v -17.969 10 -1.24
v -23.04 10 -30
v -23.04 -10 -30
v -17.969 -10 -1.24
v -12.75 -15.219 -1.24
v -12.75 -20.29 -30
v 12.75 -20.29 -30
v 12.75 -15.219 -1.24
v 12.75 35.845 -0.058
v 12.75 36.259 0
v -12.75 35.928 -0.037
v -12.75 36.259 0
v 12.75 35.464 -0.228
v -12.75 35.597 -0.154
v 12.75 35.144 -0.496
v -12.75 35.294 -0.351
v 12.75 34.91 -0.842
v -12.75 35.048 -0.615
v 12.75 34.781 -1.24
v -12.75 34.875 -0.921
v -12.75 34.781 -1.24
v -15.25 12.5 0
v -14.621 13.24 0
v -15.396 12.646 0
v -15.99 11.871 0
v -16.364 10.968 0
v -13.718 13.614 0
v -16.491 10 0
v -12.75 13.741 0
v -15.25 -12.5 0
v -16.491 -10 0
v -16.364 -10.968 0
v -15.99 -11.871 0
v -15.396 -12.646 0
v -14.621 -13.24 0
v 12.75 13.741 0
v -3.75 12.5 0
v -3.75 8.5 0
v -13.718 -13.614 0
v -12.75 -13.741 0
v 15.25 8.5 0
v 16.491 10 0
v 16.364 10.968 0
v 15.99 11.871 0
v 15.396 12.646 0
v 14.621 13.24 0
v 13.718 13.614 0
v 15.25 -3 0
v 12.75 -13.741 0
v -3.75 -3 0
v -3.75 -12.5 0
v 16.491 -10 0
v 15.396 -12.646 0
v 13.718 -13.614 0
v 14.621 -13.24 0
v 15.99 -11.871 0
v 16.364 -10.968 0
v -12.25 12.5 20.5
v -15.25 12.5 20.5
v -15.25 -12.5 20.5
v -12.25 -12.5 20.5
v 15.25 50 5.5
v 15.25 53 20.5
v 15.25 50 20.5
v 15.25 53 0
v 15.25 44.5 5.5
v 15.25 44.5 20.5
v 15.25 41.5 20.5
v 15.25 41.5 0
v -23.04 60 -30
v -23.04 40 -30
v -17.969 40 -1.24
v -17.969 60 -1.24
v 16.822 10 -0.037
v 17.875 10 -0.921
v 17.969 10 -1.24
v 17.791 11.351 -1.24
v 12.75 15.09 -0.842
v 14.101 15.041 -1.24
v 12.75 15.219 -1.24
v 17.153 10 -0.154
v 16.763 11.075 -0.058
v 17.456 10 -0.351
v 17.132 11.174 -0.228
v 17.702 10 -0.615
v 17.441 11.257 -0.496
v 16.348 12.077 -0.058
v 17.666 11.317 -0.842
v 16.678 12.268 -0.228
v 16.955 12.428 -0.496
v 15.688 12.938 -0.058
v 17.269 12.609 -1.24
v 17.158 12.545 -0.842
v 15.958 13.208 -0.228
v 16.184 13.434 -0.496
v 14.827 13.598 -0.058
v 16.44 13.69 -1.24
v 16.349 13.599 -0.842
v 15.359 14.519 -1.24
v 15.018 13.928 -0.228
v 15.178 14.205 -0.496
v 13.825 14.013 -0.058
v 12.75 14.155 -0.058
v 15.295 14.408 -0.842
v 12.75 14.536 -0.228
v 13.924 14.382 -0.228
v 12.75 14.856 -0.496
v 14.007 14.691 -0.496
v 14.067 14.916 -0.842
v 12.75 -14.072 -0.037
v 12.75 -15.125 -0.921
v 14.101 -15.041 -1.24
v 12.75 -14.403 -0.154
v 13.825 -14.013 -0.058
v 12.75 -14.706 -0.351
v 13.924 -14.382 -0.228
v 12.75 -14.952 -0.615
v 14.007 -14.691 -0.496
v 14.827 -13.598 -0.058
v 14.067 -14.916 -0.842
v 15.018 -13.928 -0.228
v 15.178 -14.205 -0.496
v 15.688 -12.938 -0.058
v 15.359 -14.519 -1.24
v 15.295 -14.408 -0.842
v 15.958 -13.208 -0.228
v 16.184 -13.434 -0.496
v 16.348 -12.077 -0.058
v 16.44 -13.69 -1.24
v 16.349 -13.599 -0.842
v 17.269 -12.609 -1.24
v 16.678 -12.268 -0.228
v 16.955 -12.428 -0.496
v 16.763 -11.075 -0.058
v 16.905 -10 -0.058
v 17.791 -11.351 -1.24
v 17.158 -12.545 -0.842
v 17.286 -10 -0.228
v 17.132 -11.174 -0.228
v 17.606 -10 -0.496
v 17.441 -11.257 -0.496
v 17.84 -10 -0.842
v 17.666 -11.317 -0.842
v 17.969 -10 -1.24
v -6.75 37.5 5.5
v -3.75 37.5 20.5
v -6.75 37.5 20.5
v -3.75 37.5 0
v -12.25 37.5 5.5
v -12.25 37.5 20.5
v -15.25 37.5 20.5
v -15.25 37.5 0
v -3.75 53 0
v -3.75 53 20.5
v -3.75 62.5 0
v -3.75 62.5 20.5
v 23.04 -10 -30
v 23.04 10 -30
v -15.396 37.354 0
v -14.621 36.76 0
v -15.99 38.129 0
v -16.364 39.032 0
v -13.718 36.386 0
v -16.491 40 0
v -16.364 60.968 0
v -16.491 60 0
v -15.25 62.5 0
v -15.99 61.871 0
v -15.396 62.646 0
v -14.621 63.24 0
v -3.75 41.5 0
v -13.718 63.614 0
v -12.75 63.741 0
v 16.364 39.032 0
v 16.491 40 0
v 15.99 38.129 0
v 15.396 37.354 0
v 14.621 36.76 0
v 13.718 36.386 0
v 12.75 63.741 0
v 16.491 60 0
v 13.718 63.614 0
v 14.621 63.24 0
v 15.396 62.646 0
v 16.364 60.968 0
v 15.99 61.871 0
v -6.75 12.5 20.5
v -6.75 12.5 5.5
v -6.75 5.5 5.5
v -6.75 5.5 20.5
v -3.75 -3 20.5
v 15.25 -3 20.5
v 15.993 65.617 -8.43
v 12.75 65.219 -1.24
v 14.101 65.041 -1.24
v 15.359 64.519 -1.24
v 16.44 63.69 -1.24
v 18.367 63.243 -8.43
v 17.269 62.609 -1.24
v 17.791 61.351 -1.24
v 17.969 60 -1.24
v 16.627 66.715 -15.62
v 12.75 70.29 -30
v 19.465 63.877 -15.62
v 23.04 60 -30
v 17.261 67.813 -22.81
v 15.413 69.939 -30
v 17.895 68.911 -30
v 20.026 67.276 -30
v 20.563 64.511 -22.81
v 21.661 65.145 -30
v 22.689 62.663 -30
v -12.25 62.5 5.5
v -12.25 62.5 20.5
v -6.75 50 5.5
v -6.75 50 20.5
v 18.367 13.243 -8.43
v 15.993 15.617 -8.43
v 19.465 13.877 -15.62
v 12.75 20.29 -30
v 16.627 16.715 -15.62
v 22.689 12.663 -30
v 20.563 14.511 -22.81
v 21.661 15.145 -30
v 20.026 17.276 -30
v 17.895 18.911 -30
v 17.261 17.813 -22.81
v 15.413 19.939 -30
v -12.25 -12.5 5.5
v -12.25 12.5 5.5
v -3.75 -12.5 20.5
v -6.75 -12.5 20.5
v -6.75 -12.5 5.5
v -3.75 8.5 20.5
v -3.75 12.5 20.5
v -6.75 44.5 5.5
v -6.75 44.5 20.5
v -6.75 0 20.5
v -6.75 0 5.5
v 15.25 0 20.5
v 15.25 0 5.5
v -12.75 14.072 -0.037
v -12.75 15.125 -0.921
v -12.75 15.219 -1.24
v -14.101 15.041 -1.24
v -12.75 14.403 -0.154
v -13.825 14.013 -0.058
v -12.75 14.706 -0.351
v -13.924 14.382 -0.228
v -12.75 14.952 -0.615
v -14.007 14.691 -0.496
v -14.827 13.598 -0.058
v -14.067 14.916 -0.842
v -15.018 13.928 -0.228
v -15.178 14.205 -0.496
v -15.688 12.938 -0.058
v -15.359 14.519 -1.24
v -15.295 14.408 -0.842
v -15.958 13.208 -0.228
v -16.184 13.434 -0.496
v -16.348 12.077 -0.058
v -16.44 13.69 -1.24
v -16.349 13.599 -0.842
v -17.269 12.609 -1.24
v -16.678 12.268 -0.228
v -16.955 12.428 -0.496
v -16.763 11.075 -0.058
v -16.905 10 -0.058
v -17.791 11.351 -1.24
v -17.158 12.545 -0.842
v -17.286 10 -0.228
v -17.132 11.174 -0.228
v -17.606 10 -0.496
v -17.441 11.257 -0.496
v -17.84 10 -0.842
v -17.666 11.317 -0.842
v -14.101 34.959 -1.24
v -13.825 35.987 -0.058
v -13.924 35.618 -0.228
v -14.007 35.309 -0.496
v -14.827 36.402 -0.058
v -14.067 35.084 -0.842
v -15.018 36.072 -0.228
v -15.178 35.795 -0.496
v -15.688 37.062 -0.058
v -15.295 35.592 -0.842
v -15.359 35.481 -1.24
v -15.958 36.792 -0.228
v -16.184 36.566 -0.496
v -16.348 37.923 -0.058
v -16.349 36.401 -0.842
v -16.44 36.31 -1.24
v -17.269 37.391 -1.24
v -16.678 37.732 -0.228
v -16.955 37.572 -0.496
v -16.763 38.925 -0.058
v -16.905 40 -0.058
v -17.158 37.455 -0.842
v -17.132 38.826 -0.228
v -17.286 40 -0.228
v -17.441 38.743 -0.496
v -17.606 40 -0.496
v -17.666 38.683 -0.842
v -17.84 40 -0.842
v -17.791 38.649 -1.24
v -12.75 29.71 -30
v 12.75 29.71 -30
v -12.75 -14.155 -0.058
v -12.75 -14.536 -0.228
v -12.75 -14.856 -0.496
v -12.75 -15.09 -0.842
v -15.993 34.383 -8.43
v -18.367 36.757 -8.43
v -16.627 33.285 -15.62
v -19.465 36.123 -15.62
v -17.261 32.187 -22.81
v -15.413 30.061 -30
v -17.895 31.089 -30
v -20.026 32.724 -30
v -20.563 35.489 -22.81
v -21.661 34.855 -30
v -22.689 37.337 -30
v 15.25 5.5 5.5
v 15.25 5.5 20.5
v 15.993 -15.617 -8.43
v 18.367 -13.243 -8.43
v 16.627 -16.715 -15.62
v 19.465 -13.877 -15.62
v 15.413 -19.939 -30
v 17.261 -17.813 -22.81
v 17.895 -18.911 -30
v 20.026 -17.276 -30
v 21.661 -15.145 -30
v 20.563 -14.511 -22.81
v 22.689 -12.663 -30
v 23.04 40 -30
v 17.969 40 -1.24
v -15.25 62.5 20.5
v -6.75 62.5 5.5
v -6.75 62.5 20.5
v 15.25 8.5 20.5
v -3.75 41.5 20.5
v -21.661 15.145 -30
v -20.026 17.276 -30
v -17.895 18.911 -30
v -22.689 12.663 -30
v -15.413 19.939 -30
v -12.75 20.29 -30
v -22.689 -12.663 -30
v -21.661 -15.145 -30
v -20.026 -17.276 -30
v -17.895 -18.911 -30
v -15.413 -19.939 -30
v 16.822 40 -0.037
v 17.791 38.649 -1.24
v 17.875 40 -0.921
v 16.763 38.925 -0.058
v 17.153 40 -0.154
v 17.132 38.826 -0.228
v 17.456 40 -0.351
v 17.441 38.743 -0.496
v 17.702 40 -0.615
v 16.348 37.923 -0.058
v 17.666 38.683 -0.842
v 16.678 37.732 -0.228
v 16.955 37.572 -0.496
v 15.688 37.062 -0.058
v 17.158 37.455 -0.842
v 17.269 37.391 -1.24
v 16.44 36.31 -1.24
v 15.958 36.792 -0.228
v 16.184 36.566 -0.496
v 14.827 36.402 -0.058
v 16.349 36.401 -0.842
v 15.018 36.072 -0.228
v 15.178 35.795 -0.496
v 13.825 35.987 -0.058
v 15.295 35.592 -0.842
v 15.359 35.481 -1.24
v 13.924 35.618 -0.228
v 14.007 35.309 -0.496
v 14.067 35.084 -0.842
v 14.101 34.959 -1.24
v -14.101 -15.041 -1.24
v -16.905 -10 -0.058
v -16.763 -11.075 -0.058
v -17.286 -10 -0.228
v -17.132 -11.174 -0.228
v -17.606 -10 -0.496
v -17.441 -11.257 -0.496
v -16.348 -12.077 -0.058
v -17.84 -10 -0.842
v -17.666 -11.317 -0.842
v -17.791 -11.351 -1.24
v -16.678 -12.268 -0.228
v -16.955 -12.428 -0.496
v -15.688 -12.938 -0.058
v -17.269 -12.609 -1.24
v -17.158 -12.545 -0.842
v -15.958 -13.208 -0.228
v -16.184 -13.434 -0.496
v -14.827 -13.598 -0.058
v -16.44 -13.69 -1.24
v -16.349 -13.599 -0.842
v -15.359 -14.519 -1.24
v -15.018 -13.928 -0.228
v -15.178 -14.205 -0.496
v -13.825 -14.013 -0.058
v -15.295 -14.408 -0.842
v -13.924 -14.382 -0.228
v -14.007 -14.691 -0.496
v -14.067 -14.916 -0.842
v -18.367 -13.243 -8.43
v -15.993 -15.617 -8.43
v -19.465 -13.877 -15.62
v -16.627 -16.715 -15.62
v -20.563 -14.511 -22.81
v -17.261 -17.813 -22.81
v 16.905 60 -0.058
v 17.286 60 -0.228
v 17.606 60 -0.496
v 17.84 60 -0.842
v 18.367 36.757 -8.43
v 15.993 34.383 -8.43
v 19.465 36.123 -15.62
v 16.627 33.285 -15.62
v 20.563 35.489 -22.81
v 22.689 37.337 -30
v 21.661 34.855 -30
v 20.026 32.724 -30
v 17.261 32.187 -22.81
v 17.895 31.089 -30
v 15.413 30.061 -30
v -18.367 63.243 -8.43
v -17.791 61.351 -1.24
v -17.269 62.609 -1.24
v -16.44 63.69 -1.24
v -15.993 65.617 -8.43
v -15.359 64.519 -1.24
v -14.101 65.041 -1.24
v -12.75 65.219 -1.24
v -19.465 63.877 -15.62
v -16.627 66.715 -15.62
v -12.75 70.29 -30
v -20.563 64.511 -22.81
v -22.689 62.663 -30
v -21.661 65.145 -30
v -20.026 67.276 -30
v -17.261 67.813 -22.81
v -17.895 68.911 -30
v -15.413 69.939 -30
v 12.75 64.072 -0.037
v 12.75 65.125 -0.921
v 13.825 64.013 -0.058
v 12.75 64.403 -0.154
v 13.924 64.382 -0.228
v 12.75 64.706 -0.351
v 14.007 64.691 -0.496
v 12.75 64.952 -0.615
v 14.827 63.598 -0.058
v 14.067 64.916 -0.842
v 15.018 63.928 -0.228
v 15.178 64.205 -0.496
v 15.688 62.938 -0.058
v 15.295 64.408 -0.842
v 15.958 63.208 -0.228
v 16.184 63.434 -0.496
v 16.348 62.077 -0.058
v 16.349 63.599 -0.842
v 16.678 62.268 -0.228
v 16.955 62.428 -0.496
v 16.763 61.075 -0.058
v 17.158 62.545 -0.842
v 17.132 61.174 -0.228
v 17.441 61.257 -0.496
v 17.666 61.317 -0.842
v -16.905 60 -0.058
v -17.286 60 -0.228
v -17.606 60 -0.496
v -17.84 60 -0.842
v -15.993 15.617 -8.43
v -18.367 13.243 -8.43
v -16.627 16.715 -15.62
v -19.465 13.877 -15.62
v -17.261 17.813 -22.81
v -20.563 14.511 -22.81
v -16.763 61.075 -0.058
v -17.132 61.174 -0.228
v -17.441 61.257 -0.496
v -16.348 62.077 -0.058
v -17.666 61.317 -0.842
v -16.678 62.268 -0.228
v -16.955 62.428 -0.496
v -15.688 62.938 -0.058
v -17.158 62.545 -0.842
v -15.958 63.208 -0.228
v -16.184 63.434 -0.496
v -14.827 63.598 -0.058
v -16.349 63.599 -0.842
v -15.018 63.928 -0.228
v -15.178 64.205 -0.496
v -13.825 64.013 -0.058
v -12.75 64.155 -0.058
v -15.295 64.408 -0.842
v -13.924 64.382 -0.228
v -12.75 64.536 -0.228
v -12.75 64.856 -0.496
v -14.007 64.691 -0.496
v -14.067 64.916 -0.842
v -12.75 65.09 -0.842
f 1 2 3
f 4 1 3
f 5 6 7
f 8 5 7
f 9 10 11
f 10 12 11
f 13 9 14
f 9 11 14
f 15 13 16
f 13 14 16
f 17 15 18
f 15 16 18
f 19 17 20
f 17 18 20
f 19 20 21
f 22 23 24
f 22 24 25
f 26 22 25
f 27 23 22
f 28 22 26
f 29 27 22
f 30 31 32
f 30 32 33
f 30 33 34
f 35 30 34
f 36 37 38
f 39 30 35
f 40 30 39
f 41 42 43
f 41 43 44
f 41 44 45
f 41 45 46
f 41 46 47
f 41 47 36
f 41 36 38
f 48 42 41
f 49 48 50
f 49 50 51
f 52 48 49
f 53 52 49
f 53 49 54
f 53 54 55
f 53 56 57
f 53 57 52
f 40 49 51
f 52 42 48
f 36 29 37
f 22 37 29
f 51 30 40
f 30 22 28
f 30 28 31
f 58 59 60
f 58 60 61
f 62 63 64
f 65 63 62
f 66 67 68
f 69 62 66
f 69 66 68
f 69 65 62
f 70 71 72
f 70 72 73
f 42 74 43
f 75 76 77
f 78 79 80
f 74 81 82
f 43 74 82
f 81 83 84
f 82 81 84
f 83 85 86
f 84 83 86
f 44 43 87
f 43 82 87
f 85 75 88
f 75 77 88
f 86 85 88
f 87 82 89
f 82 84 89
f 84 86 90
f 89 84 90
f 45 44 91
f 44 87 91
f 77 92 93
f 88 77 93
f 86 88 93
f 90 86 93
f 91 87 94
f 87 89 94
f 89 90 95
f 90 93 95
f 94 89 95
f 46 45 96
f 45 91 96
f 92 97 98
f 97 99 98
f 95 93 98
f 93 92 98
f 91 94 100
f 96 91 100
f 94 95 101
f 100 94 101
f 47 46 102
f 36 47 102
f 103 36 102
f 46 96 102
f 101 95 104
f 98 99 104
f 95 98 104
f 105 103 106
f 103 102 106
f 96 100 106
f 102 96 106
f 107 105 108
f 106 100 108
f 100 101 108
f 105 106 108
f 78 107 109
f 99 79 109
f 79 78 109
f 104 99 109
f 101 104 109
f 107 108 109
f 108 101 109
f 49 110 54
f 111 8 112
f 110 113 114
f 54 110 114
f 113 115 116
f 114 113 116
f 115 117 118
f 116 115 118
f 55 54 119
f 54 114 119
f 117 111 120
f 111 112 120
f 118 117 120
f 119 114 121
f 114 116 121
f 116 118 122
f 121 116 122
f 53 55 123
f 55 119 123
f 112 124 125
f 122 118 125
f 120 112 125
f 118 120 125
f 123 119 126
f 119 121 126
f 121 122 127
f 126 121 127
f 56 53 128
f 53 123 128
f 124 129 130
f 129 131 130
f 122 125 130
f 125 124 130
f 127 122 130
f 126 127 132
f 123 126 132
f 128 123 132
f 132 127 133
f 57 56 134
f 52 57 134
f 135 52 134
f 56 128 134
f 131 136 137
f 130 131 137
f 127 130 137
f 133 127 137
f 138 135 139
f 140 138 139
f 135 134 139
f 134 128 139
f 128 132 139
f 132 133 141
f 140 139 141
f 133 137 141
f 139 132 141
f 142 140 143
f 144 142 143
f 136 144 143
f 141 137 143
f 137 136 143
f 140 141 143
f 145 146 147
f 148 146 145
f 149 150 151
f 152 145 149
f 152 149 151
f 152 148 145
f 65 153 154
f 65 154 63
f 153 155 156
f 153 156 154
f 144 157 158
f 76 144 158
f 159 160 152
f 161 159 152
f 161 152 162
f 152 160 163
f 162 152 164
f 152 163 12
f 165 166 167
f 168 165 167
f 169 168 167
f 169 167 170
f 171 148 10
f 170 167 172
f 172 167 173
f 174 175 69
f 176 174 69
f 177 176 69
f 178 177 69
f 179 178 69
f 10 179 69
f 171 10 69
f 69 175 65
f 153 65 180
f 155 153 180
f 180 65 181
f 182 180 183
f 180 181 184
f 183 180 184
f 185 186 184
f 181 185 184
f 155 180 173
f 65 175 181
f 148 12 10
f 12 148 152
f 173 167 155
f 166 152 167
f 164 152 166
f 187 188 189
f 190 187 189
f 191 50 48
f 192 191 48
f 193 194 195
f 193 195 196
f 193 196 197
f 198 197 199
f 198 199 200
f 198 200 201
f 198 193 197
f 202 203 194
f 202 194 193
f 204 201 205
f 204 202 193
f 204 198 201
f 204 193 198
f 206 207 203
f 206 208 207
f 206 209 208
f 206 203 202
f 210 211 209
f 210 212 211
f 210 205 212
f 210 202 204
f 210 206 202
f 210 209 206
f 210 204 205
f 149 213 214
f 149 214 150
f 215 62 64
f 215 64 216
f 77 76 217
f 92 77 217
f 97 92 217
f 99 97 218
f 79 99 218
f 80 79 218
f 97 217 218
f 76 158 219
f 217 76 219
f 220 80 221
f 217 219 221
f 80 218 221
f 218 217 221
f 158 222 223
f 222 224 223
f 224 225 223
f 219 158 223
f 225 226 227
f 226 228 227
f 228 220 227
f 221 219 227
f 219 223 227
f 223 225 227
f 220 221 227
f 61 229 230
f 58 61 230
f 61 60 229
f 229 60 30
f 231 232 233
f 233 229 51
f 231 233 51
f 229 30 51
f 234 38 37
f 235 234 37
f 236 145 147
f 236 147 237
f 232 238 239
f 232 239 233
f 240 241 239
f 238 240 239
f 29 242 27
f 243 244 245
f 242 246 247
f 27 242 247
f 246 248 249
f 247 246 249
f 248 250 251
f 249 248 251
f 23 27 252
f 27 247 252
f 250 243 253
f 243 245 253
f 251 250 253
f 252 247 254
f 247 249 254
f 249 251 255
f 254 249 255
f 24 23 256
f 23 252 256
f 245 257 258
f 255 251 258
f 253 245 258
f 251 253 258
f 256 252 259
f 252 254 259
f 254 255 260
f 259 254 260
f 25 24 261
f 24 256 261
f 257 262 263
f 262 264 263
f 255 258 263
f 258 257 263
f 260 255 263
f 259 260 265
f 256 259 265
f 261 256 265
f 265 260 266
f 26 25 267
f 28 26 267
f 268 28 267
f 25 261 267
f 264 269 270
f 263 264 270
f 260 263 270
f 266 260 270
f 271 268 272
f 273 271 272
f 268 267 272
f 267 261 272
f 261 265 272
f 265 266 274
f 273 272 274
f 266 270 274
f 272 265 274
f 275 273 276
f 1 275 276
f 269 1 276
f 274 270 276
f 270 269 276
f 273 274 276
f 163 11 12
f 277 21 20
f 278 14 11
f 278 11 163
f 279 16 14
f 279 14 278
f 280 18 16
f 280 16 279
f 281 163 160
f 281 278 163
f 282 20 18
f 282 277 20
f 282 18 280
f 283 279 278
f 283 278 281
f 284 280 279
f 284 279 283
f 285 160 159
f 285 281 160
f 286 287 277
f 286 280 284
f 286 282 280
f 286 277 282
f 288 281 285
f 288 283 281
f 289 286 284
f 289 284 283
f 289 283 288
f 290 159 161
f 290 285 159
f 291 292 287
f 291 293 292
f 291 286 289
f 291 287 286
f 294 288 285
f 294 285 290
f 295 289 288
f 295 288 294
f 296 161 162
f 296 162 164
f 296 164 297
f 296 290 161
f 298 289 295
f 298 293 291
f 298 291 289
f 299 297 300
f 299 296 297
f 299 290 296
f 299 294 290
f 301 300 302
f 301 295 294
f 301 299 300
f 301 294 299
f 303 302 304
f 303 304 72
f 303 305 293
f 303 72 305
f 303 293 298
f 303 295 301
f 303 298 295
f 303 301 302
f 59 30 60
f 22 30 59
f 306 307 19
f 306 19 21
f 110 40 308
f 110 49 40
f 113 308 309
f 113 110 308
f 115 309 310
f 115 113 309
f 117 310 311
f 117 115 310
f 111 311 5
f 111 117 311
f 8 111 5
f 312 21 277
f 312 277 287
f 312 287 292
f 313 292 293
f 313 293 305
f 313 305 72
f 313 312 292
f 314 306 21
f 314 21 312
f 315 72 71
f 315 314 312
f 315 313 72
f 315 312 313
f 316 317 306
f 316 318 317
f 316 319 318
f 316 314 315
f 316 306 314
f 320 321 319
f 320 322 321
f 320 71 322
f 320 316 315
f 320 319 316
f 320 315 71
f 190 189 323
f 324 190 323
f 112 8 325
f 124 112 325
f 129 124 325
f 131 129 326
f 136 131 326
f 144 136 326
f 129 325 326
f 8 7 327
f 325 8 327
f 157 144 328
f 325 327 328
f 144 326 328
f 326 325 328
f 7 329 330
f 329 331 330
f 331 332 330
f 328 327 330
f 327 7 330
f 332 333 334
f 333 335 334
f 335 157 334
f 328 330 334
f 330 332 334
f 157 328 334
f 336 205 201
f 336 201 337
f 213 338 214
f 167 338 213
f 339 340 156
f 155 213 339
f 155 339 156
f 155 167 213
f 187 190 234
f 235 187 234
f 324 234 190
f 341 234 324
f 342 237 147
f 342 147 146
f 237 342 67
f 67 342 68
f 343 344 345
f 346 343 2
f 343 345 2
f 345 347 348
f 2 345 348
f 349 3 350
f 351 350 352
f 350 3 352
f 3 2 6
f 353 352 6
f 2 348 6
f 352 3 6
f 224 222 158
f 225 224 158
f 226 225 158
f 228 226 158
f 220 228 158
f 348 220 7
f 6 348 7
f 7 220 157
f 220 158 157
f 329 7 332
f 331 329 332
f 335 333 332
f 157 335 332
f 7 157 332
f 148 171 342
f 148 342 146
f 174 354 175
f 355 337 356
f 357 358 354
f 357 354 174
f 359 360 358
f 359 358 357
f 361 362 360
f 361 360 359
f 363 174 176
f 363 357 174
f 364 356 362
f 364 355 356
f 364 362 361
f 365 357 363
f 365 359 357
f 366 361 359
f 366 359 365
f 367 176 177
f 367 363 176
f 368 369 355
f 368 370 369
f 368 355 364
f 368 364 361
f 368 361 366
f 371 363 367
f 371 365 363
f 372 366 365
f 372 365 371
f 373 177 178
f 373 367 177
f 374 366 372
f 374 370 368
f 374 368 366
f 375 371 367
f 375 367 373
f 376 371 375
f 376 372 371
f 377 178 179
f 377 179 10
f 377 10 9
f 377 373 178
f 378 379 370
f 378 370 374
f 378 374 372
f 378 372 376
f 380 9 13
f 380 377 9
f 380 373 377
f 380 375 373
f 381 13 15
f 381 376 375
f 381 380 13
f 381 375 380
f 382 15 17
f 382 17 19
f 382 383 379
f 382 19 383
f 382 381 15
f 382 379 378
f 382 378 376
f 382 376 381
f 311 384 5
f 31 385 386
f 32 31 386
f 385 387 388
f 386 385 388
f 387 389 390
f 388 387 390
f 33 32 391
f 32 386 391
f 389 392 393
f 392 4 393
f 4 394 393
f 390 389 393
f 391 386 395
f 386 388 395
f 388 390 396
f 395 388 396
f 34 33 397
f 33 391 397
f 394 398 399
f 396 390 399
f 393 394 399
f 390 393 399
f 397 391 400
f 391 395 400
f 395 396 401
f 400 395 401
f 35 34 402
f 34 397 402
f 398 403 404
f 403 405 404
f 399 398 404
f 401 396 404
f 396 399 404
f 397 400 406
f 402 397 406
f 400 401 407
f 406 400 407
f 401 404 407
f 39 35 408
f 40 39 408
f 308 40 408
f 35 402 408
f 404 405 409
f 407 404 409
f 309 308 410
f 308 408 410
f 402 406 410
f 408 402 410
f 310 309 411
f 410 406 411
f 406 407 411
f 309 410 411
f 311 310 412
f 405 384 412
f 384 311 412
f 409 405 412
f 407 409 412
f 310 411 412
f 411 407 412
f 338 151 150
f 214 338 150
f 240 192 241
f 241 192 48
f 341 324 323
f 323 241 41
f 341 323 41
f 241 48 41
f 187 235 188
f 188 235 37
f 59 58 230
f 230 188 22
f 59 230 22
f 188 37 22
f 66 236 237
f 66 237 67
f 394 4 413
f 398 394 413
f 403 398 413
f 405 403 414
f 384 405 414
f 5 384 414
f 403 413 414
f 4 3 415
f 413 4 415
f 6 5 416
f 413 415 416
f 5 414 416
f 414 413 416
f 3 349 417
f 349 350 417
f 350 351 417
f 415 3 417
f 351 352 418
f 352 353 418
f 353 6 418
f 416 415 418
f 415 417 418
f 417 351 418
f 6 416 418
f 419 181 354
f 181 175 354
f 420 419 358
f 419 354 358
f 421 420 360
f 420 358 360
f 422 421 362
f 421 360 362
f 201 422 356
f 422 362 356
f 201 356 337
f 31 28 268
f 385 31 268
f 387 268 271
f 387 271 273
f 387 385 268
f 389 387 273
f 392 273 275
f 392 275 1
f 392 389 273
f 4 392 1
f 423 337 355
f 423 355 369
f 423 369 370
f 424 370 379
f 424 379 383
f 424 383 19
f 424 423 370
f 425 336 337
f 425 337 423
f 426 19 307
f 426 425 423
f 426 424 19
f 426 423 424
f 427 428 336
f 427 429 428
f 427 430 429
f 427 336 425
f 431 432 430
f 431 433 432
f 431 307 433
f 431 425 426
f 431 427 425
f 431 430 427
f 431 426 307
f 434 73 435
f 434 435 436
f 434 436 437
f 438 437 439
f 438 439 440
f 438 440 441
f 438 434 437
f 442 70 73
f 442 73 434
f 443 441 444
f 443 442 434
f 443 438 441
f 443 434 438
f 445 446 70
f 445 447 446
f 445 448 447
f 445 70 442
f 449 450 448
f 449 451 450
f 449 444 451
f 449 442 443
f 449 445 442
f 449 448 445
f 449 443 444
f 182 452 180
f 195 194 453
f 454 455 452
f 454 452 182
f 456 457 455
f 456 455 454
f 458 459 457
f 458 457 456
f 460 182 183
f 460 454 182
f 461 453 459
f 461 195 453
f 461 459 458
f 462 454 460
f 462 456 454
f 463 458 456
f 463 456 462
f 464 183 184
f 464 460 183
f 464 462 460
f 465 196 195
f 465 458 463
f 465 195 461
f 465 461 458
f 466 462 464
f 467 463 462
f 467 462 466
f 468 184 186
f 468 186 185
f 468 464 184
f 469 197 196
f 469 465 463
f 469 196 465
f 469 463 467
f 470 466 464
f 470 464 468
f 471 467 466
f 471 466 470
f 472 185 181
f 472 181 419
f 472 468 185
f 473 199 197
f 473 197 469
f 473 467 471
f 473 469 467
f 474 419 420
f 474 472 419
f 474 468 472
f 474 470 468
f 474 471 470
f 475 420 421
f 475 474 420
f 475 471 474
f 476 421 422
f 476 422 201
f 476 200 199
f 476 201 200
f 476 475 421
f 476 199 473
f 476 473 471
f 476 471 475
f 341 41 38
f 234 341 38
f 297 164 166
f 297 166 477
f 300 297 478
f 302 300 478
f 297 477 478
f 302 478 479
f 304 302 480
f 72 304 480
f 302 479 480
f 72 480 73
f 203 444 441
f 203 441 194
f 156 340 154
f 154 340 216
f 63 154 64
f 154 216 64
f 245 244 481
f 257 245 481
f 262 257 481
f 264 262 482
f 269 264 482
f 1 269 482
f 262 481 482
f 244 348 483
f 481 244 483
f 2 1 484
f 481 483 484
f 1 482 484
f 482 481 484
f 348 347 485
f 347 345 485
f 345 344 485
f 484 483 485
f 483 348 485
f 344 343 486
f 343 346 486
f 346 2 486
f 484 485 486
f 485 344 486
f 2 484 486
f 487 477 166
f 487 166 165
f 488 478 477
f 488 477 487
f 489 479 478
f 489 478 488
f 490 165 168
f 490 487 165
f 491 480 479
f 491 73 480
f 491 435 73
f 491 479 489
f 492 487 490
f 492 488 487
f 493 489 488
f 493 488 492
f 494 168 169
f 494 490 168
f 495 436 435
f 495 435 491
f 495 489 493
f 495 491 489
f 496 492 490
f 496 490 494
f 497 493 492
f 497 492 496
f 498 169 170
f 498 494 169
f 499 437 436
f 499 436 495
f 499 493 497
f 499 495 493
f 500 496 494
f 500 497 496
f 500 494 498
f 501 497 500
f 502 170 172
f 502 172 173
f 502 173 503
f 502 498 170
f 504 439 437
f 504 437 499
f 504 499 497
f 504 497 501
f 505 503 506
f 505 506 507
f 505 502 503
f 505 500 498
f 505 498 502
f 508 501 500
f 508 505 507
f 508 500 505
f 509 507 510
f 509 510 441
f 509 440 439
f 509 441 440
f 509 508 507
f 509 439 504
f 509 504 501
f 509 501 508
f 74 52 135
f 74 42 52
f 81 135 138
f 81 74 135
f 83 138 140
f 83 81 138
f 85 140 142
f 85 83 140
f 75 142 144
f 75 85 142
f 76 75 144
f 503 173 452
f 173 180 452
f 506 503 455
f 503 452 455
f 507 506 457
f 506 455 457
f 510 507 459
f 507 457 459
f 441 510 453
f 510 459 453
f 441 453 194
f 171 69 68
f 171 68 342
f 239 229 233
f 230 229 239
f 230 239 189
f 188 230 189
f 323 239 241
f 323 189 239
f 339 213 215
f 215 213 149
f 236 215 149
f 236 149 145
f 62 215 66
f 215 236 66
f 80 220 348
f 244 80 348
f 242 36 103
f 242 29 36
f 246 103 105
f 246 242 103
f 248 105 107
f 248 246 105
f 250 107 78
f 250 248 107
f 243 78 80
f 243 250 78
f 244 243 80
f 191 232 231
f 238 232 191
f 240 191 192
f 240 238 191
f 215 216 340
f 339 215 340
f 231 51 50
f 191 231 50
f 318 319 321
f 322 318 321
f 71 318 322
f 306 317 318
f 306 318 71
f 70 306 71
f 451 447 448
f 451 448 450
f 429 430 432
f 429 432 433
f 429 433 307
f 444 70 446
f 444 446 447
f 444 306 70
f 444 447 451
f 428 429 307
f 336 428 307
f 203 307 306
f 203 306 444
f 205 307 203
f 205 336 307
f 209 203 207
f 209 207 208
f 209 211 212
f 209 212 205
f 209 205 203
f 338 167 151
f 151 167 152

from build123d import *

# Parameters (mm, degrees)
F0_W     = 3
F0_H     = 25
F1_DEPTH = 20.5
F2_DEPTH = 5.5
F0_W_2   = 19
F0_H_2   = 4
F0_H_3   = 9.5
F3_DEPTH = 30
F3_TAPER = -10
F4_R     = 1.5


with BuildPart() as f1:
    # F0 (on Top) → F1 (new body)
    with BuildSketch(Plane.XY):
        with Locations((-13.75, 0)):
            Rectangle(F0_W, F0_H)
    extrude(amount=F1_DEPTH)



with BuildPart() as f1b:
    # F0 (on Top) → F1, piece 2 (new body)
    with BuildSketch(Plane.XY):
        Polygon((15.25, -3), (15.25, 0), (-6.75, 0), (-6.75, -12.5), (-3.75, -12.5), (-3.75, -3), align=None)
    extrude(amount=F1_DEPTH)


with BuildPart() as f1c:
    # F0 (on Top) → F1, piece 3 (new body)
    with BuildSketch(Plane.XY):
        Polygon((-3.75, 8.5), (-3.75, 12.5), (-6.75, 12.5), (-6.75, 5.5), (15.25, 5.5), (15.25, 8.5), align=None)
    extrude(amount=F1_DEPTH)


with BuildPart() as f1_1:
    add(f1.part)

    add(f1b.part)  # F2 merges F1b

    add(f1c.part)  # F2 merges F1c
    # F0 (on Top) → F2 (join)
    with BuildSketch(Plane.XY):
        Polygon((-6.75, 5.5), (-6.75, 12.5), (-12.25, 12.5), (-12.25, -12.5), (-6.75, -12.5), (-6.75, 0), (15.25, 0), (15.25, 5.5), align=None)
    extrude(amount=F2_DEPTH)

    # F0 (on Top) → F3 (join)
    with BuildSketch(Plane.XY):
        with BuildLine():
            Line((-12.75, -15), (12.75, -15))
            ThreePointArc((12.75, -15), (16.2855339059, -13.5355339059), (17.75, -10))
            Line((17.75, -10), (17.75, 10))
            ThreePointArc((17.75, 10), (16.2855339059, 13.5355339059), (12.75, 15))
            Line((12.75, 15), (-12.75, 15))
            ThreePointArc((-12.75, 15), (-16.2855339059, 13.5355339059), (-17.75, 10))
            Line((-17.75, 10), (-17.75, -10))
            ThreePointArc((-17.75, -10), (-16.2855339059, -13.5355339059), (-12.75, -15))
        make_face()
        Polygon((-3.75, 12.5), (15.25, 12.5), (15.25, 8.5), (15.25, 5.5), (15.25, 0), (15.25, -3), (15.25, -12.5), (-3.75, -12.5), (-6.75, -12.5), (-12.25, -12.5), (-15.25, -12.5), (-15.25, 12.5), (-12.25, 12.5), (-6.75, 12.5), align=None, mode=Mode.SUBTRACT)
        with Locations((-13.75, 0)):
            Rectangle(F0_W, F0_H)
        Polygon((-6.75, 5.5), (-6.75, 12.5), (-12.25, 12.5), (-12.25, -12.5), (-6.75, -12.5), (-6.75, 0), (15.25, 0), (15.25, 5.5), align=None)
        Polygon((15.25, -3), (15.25, 0), (-6.75, 0), (-6.75, -12.5), (-3.75, -12.5), (-3.75, -3), align=None)
        Polygon((-3.75, 8.5), (-3.75, 12.5), (-6.75, 12.5), (-6.75, 5.5), (15.25, 5.5), (15.25, 8.5), align=None)
        with Locations((5.75, 10.5)):
            Rectangle(F0_W_2, F0_H_2)
        with Locations((5.75, -7.75)):
            Rectangle(F0_W_2, F0_H_3)
    extrude(amount=-F3_DEPTH, taper=F3_TAPER)

    # F4
    f4_edges = [f1_1.edges().sort_by_distance(p)[0] for p in [
        (-17.75, 0, 0),
        (-16.285534, -13.535534, 0),
        (-16.285534, 13.535534, 0),
        (0, 15, 0),
        (16.285534, 13.535534, 0),
        (17.75, 0, 0),
        (0, -15, 0),
        (16.285534, -13.535534, 0),
    ]]
    fillet(f4_edges, radius=F4_R)


with BuildPart() as f6_1:
    # F6: instance of F1
    add(f1_1.part.mirror(Plane.XZ.offset(-25)))


solid = Compound([f1_1.part, f6_1.part])
